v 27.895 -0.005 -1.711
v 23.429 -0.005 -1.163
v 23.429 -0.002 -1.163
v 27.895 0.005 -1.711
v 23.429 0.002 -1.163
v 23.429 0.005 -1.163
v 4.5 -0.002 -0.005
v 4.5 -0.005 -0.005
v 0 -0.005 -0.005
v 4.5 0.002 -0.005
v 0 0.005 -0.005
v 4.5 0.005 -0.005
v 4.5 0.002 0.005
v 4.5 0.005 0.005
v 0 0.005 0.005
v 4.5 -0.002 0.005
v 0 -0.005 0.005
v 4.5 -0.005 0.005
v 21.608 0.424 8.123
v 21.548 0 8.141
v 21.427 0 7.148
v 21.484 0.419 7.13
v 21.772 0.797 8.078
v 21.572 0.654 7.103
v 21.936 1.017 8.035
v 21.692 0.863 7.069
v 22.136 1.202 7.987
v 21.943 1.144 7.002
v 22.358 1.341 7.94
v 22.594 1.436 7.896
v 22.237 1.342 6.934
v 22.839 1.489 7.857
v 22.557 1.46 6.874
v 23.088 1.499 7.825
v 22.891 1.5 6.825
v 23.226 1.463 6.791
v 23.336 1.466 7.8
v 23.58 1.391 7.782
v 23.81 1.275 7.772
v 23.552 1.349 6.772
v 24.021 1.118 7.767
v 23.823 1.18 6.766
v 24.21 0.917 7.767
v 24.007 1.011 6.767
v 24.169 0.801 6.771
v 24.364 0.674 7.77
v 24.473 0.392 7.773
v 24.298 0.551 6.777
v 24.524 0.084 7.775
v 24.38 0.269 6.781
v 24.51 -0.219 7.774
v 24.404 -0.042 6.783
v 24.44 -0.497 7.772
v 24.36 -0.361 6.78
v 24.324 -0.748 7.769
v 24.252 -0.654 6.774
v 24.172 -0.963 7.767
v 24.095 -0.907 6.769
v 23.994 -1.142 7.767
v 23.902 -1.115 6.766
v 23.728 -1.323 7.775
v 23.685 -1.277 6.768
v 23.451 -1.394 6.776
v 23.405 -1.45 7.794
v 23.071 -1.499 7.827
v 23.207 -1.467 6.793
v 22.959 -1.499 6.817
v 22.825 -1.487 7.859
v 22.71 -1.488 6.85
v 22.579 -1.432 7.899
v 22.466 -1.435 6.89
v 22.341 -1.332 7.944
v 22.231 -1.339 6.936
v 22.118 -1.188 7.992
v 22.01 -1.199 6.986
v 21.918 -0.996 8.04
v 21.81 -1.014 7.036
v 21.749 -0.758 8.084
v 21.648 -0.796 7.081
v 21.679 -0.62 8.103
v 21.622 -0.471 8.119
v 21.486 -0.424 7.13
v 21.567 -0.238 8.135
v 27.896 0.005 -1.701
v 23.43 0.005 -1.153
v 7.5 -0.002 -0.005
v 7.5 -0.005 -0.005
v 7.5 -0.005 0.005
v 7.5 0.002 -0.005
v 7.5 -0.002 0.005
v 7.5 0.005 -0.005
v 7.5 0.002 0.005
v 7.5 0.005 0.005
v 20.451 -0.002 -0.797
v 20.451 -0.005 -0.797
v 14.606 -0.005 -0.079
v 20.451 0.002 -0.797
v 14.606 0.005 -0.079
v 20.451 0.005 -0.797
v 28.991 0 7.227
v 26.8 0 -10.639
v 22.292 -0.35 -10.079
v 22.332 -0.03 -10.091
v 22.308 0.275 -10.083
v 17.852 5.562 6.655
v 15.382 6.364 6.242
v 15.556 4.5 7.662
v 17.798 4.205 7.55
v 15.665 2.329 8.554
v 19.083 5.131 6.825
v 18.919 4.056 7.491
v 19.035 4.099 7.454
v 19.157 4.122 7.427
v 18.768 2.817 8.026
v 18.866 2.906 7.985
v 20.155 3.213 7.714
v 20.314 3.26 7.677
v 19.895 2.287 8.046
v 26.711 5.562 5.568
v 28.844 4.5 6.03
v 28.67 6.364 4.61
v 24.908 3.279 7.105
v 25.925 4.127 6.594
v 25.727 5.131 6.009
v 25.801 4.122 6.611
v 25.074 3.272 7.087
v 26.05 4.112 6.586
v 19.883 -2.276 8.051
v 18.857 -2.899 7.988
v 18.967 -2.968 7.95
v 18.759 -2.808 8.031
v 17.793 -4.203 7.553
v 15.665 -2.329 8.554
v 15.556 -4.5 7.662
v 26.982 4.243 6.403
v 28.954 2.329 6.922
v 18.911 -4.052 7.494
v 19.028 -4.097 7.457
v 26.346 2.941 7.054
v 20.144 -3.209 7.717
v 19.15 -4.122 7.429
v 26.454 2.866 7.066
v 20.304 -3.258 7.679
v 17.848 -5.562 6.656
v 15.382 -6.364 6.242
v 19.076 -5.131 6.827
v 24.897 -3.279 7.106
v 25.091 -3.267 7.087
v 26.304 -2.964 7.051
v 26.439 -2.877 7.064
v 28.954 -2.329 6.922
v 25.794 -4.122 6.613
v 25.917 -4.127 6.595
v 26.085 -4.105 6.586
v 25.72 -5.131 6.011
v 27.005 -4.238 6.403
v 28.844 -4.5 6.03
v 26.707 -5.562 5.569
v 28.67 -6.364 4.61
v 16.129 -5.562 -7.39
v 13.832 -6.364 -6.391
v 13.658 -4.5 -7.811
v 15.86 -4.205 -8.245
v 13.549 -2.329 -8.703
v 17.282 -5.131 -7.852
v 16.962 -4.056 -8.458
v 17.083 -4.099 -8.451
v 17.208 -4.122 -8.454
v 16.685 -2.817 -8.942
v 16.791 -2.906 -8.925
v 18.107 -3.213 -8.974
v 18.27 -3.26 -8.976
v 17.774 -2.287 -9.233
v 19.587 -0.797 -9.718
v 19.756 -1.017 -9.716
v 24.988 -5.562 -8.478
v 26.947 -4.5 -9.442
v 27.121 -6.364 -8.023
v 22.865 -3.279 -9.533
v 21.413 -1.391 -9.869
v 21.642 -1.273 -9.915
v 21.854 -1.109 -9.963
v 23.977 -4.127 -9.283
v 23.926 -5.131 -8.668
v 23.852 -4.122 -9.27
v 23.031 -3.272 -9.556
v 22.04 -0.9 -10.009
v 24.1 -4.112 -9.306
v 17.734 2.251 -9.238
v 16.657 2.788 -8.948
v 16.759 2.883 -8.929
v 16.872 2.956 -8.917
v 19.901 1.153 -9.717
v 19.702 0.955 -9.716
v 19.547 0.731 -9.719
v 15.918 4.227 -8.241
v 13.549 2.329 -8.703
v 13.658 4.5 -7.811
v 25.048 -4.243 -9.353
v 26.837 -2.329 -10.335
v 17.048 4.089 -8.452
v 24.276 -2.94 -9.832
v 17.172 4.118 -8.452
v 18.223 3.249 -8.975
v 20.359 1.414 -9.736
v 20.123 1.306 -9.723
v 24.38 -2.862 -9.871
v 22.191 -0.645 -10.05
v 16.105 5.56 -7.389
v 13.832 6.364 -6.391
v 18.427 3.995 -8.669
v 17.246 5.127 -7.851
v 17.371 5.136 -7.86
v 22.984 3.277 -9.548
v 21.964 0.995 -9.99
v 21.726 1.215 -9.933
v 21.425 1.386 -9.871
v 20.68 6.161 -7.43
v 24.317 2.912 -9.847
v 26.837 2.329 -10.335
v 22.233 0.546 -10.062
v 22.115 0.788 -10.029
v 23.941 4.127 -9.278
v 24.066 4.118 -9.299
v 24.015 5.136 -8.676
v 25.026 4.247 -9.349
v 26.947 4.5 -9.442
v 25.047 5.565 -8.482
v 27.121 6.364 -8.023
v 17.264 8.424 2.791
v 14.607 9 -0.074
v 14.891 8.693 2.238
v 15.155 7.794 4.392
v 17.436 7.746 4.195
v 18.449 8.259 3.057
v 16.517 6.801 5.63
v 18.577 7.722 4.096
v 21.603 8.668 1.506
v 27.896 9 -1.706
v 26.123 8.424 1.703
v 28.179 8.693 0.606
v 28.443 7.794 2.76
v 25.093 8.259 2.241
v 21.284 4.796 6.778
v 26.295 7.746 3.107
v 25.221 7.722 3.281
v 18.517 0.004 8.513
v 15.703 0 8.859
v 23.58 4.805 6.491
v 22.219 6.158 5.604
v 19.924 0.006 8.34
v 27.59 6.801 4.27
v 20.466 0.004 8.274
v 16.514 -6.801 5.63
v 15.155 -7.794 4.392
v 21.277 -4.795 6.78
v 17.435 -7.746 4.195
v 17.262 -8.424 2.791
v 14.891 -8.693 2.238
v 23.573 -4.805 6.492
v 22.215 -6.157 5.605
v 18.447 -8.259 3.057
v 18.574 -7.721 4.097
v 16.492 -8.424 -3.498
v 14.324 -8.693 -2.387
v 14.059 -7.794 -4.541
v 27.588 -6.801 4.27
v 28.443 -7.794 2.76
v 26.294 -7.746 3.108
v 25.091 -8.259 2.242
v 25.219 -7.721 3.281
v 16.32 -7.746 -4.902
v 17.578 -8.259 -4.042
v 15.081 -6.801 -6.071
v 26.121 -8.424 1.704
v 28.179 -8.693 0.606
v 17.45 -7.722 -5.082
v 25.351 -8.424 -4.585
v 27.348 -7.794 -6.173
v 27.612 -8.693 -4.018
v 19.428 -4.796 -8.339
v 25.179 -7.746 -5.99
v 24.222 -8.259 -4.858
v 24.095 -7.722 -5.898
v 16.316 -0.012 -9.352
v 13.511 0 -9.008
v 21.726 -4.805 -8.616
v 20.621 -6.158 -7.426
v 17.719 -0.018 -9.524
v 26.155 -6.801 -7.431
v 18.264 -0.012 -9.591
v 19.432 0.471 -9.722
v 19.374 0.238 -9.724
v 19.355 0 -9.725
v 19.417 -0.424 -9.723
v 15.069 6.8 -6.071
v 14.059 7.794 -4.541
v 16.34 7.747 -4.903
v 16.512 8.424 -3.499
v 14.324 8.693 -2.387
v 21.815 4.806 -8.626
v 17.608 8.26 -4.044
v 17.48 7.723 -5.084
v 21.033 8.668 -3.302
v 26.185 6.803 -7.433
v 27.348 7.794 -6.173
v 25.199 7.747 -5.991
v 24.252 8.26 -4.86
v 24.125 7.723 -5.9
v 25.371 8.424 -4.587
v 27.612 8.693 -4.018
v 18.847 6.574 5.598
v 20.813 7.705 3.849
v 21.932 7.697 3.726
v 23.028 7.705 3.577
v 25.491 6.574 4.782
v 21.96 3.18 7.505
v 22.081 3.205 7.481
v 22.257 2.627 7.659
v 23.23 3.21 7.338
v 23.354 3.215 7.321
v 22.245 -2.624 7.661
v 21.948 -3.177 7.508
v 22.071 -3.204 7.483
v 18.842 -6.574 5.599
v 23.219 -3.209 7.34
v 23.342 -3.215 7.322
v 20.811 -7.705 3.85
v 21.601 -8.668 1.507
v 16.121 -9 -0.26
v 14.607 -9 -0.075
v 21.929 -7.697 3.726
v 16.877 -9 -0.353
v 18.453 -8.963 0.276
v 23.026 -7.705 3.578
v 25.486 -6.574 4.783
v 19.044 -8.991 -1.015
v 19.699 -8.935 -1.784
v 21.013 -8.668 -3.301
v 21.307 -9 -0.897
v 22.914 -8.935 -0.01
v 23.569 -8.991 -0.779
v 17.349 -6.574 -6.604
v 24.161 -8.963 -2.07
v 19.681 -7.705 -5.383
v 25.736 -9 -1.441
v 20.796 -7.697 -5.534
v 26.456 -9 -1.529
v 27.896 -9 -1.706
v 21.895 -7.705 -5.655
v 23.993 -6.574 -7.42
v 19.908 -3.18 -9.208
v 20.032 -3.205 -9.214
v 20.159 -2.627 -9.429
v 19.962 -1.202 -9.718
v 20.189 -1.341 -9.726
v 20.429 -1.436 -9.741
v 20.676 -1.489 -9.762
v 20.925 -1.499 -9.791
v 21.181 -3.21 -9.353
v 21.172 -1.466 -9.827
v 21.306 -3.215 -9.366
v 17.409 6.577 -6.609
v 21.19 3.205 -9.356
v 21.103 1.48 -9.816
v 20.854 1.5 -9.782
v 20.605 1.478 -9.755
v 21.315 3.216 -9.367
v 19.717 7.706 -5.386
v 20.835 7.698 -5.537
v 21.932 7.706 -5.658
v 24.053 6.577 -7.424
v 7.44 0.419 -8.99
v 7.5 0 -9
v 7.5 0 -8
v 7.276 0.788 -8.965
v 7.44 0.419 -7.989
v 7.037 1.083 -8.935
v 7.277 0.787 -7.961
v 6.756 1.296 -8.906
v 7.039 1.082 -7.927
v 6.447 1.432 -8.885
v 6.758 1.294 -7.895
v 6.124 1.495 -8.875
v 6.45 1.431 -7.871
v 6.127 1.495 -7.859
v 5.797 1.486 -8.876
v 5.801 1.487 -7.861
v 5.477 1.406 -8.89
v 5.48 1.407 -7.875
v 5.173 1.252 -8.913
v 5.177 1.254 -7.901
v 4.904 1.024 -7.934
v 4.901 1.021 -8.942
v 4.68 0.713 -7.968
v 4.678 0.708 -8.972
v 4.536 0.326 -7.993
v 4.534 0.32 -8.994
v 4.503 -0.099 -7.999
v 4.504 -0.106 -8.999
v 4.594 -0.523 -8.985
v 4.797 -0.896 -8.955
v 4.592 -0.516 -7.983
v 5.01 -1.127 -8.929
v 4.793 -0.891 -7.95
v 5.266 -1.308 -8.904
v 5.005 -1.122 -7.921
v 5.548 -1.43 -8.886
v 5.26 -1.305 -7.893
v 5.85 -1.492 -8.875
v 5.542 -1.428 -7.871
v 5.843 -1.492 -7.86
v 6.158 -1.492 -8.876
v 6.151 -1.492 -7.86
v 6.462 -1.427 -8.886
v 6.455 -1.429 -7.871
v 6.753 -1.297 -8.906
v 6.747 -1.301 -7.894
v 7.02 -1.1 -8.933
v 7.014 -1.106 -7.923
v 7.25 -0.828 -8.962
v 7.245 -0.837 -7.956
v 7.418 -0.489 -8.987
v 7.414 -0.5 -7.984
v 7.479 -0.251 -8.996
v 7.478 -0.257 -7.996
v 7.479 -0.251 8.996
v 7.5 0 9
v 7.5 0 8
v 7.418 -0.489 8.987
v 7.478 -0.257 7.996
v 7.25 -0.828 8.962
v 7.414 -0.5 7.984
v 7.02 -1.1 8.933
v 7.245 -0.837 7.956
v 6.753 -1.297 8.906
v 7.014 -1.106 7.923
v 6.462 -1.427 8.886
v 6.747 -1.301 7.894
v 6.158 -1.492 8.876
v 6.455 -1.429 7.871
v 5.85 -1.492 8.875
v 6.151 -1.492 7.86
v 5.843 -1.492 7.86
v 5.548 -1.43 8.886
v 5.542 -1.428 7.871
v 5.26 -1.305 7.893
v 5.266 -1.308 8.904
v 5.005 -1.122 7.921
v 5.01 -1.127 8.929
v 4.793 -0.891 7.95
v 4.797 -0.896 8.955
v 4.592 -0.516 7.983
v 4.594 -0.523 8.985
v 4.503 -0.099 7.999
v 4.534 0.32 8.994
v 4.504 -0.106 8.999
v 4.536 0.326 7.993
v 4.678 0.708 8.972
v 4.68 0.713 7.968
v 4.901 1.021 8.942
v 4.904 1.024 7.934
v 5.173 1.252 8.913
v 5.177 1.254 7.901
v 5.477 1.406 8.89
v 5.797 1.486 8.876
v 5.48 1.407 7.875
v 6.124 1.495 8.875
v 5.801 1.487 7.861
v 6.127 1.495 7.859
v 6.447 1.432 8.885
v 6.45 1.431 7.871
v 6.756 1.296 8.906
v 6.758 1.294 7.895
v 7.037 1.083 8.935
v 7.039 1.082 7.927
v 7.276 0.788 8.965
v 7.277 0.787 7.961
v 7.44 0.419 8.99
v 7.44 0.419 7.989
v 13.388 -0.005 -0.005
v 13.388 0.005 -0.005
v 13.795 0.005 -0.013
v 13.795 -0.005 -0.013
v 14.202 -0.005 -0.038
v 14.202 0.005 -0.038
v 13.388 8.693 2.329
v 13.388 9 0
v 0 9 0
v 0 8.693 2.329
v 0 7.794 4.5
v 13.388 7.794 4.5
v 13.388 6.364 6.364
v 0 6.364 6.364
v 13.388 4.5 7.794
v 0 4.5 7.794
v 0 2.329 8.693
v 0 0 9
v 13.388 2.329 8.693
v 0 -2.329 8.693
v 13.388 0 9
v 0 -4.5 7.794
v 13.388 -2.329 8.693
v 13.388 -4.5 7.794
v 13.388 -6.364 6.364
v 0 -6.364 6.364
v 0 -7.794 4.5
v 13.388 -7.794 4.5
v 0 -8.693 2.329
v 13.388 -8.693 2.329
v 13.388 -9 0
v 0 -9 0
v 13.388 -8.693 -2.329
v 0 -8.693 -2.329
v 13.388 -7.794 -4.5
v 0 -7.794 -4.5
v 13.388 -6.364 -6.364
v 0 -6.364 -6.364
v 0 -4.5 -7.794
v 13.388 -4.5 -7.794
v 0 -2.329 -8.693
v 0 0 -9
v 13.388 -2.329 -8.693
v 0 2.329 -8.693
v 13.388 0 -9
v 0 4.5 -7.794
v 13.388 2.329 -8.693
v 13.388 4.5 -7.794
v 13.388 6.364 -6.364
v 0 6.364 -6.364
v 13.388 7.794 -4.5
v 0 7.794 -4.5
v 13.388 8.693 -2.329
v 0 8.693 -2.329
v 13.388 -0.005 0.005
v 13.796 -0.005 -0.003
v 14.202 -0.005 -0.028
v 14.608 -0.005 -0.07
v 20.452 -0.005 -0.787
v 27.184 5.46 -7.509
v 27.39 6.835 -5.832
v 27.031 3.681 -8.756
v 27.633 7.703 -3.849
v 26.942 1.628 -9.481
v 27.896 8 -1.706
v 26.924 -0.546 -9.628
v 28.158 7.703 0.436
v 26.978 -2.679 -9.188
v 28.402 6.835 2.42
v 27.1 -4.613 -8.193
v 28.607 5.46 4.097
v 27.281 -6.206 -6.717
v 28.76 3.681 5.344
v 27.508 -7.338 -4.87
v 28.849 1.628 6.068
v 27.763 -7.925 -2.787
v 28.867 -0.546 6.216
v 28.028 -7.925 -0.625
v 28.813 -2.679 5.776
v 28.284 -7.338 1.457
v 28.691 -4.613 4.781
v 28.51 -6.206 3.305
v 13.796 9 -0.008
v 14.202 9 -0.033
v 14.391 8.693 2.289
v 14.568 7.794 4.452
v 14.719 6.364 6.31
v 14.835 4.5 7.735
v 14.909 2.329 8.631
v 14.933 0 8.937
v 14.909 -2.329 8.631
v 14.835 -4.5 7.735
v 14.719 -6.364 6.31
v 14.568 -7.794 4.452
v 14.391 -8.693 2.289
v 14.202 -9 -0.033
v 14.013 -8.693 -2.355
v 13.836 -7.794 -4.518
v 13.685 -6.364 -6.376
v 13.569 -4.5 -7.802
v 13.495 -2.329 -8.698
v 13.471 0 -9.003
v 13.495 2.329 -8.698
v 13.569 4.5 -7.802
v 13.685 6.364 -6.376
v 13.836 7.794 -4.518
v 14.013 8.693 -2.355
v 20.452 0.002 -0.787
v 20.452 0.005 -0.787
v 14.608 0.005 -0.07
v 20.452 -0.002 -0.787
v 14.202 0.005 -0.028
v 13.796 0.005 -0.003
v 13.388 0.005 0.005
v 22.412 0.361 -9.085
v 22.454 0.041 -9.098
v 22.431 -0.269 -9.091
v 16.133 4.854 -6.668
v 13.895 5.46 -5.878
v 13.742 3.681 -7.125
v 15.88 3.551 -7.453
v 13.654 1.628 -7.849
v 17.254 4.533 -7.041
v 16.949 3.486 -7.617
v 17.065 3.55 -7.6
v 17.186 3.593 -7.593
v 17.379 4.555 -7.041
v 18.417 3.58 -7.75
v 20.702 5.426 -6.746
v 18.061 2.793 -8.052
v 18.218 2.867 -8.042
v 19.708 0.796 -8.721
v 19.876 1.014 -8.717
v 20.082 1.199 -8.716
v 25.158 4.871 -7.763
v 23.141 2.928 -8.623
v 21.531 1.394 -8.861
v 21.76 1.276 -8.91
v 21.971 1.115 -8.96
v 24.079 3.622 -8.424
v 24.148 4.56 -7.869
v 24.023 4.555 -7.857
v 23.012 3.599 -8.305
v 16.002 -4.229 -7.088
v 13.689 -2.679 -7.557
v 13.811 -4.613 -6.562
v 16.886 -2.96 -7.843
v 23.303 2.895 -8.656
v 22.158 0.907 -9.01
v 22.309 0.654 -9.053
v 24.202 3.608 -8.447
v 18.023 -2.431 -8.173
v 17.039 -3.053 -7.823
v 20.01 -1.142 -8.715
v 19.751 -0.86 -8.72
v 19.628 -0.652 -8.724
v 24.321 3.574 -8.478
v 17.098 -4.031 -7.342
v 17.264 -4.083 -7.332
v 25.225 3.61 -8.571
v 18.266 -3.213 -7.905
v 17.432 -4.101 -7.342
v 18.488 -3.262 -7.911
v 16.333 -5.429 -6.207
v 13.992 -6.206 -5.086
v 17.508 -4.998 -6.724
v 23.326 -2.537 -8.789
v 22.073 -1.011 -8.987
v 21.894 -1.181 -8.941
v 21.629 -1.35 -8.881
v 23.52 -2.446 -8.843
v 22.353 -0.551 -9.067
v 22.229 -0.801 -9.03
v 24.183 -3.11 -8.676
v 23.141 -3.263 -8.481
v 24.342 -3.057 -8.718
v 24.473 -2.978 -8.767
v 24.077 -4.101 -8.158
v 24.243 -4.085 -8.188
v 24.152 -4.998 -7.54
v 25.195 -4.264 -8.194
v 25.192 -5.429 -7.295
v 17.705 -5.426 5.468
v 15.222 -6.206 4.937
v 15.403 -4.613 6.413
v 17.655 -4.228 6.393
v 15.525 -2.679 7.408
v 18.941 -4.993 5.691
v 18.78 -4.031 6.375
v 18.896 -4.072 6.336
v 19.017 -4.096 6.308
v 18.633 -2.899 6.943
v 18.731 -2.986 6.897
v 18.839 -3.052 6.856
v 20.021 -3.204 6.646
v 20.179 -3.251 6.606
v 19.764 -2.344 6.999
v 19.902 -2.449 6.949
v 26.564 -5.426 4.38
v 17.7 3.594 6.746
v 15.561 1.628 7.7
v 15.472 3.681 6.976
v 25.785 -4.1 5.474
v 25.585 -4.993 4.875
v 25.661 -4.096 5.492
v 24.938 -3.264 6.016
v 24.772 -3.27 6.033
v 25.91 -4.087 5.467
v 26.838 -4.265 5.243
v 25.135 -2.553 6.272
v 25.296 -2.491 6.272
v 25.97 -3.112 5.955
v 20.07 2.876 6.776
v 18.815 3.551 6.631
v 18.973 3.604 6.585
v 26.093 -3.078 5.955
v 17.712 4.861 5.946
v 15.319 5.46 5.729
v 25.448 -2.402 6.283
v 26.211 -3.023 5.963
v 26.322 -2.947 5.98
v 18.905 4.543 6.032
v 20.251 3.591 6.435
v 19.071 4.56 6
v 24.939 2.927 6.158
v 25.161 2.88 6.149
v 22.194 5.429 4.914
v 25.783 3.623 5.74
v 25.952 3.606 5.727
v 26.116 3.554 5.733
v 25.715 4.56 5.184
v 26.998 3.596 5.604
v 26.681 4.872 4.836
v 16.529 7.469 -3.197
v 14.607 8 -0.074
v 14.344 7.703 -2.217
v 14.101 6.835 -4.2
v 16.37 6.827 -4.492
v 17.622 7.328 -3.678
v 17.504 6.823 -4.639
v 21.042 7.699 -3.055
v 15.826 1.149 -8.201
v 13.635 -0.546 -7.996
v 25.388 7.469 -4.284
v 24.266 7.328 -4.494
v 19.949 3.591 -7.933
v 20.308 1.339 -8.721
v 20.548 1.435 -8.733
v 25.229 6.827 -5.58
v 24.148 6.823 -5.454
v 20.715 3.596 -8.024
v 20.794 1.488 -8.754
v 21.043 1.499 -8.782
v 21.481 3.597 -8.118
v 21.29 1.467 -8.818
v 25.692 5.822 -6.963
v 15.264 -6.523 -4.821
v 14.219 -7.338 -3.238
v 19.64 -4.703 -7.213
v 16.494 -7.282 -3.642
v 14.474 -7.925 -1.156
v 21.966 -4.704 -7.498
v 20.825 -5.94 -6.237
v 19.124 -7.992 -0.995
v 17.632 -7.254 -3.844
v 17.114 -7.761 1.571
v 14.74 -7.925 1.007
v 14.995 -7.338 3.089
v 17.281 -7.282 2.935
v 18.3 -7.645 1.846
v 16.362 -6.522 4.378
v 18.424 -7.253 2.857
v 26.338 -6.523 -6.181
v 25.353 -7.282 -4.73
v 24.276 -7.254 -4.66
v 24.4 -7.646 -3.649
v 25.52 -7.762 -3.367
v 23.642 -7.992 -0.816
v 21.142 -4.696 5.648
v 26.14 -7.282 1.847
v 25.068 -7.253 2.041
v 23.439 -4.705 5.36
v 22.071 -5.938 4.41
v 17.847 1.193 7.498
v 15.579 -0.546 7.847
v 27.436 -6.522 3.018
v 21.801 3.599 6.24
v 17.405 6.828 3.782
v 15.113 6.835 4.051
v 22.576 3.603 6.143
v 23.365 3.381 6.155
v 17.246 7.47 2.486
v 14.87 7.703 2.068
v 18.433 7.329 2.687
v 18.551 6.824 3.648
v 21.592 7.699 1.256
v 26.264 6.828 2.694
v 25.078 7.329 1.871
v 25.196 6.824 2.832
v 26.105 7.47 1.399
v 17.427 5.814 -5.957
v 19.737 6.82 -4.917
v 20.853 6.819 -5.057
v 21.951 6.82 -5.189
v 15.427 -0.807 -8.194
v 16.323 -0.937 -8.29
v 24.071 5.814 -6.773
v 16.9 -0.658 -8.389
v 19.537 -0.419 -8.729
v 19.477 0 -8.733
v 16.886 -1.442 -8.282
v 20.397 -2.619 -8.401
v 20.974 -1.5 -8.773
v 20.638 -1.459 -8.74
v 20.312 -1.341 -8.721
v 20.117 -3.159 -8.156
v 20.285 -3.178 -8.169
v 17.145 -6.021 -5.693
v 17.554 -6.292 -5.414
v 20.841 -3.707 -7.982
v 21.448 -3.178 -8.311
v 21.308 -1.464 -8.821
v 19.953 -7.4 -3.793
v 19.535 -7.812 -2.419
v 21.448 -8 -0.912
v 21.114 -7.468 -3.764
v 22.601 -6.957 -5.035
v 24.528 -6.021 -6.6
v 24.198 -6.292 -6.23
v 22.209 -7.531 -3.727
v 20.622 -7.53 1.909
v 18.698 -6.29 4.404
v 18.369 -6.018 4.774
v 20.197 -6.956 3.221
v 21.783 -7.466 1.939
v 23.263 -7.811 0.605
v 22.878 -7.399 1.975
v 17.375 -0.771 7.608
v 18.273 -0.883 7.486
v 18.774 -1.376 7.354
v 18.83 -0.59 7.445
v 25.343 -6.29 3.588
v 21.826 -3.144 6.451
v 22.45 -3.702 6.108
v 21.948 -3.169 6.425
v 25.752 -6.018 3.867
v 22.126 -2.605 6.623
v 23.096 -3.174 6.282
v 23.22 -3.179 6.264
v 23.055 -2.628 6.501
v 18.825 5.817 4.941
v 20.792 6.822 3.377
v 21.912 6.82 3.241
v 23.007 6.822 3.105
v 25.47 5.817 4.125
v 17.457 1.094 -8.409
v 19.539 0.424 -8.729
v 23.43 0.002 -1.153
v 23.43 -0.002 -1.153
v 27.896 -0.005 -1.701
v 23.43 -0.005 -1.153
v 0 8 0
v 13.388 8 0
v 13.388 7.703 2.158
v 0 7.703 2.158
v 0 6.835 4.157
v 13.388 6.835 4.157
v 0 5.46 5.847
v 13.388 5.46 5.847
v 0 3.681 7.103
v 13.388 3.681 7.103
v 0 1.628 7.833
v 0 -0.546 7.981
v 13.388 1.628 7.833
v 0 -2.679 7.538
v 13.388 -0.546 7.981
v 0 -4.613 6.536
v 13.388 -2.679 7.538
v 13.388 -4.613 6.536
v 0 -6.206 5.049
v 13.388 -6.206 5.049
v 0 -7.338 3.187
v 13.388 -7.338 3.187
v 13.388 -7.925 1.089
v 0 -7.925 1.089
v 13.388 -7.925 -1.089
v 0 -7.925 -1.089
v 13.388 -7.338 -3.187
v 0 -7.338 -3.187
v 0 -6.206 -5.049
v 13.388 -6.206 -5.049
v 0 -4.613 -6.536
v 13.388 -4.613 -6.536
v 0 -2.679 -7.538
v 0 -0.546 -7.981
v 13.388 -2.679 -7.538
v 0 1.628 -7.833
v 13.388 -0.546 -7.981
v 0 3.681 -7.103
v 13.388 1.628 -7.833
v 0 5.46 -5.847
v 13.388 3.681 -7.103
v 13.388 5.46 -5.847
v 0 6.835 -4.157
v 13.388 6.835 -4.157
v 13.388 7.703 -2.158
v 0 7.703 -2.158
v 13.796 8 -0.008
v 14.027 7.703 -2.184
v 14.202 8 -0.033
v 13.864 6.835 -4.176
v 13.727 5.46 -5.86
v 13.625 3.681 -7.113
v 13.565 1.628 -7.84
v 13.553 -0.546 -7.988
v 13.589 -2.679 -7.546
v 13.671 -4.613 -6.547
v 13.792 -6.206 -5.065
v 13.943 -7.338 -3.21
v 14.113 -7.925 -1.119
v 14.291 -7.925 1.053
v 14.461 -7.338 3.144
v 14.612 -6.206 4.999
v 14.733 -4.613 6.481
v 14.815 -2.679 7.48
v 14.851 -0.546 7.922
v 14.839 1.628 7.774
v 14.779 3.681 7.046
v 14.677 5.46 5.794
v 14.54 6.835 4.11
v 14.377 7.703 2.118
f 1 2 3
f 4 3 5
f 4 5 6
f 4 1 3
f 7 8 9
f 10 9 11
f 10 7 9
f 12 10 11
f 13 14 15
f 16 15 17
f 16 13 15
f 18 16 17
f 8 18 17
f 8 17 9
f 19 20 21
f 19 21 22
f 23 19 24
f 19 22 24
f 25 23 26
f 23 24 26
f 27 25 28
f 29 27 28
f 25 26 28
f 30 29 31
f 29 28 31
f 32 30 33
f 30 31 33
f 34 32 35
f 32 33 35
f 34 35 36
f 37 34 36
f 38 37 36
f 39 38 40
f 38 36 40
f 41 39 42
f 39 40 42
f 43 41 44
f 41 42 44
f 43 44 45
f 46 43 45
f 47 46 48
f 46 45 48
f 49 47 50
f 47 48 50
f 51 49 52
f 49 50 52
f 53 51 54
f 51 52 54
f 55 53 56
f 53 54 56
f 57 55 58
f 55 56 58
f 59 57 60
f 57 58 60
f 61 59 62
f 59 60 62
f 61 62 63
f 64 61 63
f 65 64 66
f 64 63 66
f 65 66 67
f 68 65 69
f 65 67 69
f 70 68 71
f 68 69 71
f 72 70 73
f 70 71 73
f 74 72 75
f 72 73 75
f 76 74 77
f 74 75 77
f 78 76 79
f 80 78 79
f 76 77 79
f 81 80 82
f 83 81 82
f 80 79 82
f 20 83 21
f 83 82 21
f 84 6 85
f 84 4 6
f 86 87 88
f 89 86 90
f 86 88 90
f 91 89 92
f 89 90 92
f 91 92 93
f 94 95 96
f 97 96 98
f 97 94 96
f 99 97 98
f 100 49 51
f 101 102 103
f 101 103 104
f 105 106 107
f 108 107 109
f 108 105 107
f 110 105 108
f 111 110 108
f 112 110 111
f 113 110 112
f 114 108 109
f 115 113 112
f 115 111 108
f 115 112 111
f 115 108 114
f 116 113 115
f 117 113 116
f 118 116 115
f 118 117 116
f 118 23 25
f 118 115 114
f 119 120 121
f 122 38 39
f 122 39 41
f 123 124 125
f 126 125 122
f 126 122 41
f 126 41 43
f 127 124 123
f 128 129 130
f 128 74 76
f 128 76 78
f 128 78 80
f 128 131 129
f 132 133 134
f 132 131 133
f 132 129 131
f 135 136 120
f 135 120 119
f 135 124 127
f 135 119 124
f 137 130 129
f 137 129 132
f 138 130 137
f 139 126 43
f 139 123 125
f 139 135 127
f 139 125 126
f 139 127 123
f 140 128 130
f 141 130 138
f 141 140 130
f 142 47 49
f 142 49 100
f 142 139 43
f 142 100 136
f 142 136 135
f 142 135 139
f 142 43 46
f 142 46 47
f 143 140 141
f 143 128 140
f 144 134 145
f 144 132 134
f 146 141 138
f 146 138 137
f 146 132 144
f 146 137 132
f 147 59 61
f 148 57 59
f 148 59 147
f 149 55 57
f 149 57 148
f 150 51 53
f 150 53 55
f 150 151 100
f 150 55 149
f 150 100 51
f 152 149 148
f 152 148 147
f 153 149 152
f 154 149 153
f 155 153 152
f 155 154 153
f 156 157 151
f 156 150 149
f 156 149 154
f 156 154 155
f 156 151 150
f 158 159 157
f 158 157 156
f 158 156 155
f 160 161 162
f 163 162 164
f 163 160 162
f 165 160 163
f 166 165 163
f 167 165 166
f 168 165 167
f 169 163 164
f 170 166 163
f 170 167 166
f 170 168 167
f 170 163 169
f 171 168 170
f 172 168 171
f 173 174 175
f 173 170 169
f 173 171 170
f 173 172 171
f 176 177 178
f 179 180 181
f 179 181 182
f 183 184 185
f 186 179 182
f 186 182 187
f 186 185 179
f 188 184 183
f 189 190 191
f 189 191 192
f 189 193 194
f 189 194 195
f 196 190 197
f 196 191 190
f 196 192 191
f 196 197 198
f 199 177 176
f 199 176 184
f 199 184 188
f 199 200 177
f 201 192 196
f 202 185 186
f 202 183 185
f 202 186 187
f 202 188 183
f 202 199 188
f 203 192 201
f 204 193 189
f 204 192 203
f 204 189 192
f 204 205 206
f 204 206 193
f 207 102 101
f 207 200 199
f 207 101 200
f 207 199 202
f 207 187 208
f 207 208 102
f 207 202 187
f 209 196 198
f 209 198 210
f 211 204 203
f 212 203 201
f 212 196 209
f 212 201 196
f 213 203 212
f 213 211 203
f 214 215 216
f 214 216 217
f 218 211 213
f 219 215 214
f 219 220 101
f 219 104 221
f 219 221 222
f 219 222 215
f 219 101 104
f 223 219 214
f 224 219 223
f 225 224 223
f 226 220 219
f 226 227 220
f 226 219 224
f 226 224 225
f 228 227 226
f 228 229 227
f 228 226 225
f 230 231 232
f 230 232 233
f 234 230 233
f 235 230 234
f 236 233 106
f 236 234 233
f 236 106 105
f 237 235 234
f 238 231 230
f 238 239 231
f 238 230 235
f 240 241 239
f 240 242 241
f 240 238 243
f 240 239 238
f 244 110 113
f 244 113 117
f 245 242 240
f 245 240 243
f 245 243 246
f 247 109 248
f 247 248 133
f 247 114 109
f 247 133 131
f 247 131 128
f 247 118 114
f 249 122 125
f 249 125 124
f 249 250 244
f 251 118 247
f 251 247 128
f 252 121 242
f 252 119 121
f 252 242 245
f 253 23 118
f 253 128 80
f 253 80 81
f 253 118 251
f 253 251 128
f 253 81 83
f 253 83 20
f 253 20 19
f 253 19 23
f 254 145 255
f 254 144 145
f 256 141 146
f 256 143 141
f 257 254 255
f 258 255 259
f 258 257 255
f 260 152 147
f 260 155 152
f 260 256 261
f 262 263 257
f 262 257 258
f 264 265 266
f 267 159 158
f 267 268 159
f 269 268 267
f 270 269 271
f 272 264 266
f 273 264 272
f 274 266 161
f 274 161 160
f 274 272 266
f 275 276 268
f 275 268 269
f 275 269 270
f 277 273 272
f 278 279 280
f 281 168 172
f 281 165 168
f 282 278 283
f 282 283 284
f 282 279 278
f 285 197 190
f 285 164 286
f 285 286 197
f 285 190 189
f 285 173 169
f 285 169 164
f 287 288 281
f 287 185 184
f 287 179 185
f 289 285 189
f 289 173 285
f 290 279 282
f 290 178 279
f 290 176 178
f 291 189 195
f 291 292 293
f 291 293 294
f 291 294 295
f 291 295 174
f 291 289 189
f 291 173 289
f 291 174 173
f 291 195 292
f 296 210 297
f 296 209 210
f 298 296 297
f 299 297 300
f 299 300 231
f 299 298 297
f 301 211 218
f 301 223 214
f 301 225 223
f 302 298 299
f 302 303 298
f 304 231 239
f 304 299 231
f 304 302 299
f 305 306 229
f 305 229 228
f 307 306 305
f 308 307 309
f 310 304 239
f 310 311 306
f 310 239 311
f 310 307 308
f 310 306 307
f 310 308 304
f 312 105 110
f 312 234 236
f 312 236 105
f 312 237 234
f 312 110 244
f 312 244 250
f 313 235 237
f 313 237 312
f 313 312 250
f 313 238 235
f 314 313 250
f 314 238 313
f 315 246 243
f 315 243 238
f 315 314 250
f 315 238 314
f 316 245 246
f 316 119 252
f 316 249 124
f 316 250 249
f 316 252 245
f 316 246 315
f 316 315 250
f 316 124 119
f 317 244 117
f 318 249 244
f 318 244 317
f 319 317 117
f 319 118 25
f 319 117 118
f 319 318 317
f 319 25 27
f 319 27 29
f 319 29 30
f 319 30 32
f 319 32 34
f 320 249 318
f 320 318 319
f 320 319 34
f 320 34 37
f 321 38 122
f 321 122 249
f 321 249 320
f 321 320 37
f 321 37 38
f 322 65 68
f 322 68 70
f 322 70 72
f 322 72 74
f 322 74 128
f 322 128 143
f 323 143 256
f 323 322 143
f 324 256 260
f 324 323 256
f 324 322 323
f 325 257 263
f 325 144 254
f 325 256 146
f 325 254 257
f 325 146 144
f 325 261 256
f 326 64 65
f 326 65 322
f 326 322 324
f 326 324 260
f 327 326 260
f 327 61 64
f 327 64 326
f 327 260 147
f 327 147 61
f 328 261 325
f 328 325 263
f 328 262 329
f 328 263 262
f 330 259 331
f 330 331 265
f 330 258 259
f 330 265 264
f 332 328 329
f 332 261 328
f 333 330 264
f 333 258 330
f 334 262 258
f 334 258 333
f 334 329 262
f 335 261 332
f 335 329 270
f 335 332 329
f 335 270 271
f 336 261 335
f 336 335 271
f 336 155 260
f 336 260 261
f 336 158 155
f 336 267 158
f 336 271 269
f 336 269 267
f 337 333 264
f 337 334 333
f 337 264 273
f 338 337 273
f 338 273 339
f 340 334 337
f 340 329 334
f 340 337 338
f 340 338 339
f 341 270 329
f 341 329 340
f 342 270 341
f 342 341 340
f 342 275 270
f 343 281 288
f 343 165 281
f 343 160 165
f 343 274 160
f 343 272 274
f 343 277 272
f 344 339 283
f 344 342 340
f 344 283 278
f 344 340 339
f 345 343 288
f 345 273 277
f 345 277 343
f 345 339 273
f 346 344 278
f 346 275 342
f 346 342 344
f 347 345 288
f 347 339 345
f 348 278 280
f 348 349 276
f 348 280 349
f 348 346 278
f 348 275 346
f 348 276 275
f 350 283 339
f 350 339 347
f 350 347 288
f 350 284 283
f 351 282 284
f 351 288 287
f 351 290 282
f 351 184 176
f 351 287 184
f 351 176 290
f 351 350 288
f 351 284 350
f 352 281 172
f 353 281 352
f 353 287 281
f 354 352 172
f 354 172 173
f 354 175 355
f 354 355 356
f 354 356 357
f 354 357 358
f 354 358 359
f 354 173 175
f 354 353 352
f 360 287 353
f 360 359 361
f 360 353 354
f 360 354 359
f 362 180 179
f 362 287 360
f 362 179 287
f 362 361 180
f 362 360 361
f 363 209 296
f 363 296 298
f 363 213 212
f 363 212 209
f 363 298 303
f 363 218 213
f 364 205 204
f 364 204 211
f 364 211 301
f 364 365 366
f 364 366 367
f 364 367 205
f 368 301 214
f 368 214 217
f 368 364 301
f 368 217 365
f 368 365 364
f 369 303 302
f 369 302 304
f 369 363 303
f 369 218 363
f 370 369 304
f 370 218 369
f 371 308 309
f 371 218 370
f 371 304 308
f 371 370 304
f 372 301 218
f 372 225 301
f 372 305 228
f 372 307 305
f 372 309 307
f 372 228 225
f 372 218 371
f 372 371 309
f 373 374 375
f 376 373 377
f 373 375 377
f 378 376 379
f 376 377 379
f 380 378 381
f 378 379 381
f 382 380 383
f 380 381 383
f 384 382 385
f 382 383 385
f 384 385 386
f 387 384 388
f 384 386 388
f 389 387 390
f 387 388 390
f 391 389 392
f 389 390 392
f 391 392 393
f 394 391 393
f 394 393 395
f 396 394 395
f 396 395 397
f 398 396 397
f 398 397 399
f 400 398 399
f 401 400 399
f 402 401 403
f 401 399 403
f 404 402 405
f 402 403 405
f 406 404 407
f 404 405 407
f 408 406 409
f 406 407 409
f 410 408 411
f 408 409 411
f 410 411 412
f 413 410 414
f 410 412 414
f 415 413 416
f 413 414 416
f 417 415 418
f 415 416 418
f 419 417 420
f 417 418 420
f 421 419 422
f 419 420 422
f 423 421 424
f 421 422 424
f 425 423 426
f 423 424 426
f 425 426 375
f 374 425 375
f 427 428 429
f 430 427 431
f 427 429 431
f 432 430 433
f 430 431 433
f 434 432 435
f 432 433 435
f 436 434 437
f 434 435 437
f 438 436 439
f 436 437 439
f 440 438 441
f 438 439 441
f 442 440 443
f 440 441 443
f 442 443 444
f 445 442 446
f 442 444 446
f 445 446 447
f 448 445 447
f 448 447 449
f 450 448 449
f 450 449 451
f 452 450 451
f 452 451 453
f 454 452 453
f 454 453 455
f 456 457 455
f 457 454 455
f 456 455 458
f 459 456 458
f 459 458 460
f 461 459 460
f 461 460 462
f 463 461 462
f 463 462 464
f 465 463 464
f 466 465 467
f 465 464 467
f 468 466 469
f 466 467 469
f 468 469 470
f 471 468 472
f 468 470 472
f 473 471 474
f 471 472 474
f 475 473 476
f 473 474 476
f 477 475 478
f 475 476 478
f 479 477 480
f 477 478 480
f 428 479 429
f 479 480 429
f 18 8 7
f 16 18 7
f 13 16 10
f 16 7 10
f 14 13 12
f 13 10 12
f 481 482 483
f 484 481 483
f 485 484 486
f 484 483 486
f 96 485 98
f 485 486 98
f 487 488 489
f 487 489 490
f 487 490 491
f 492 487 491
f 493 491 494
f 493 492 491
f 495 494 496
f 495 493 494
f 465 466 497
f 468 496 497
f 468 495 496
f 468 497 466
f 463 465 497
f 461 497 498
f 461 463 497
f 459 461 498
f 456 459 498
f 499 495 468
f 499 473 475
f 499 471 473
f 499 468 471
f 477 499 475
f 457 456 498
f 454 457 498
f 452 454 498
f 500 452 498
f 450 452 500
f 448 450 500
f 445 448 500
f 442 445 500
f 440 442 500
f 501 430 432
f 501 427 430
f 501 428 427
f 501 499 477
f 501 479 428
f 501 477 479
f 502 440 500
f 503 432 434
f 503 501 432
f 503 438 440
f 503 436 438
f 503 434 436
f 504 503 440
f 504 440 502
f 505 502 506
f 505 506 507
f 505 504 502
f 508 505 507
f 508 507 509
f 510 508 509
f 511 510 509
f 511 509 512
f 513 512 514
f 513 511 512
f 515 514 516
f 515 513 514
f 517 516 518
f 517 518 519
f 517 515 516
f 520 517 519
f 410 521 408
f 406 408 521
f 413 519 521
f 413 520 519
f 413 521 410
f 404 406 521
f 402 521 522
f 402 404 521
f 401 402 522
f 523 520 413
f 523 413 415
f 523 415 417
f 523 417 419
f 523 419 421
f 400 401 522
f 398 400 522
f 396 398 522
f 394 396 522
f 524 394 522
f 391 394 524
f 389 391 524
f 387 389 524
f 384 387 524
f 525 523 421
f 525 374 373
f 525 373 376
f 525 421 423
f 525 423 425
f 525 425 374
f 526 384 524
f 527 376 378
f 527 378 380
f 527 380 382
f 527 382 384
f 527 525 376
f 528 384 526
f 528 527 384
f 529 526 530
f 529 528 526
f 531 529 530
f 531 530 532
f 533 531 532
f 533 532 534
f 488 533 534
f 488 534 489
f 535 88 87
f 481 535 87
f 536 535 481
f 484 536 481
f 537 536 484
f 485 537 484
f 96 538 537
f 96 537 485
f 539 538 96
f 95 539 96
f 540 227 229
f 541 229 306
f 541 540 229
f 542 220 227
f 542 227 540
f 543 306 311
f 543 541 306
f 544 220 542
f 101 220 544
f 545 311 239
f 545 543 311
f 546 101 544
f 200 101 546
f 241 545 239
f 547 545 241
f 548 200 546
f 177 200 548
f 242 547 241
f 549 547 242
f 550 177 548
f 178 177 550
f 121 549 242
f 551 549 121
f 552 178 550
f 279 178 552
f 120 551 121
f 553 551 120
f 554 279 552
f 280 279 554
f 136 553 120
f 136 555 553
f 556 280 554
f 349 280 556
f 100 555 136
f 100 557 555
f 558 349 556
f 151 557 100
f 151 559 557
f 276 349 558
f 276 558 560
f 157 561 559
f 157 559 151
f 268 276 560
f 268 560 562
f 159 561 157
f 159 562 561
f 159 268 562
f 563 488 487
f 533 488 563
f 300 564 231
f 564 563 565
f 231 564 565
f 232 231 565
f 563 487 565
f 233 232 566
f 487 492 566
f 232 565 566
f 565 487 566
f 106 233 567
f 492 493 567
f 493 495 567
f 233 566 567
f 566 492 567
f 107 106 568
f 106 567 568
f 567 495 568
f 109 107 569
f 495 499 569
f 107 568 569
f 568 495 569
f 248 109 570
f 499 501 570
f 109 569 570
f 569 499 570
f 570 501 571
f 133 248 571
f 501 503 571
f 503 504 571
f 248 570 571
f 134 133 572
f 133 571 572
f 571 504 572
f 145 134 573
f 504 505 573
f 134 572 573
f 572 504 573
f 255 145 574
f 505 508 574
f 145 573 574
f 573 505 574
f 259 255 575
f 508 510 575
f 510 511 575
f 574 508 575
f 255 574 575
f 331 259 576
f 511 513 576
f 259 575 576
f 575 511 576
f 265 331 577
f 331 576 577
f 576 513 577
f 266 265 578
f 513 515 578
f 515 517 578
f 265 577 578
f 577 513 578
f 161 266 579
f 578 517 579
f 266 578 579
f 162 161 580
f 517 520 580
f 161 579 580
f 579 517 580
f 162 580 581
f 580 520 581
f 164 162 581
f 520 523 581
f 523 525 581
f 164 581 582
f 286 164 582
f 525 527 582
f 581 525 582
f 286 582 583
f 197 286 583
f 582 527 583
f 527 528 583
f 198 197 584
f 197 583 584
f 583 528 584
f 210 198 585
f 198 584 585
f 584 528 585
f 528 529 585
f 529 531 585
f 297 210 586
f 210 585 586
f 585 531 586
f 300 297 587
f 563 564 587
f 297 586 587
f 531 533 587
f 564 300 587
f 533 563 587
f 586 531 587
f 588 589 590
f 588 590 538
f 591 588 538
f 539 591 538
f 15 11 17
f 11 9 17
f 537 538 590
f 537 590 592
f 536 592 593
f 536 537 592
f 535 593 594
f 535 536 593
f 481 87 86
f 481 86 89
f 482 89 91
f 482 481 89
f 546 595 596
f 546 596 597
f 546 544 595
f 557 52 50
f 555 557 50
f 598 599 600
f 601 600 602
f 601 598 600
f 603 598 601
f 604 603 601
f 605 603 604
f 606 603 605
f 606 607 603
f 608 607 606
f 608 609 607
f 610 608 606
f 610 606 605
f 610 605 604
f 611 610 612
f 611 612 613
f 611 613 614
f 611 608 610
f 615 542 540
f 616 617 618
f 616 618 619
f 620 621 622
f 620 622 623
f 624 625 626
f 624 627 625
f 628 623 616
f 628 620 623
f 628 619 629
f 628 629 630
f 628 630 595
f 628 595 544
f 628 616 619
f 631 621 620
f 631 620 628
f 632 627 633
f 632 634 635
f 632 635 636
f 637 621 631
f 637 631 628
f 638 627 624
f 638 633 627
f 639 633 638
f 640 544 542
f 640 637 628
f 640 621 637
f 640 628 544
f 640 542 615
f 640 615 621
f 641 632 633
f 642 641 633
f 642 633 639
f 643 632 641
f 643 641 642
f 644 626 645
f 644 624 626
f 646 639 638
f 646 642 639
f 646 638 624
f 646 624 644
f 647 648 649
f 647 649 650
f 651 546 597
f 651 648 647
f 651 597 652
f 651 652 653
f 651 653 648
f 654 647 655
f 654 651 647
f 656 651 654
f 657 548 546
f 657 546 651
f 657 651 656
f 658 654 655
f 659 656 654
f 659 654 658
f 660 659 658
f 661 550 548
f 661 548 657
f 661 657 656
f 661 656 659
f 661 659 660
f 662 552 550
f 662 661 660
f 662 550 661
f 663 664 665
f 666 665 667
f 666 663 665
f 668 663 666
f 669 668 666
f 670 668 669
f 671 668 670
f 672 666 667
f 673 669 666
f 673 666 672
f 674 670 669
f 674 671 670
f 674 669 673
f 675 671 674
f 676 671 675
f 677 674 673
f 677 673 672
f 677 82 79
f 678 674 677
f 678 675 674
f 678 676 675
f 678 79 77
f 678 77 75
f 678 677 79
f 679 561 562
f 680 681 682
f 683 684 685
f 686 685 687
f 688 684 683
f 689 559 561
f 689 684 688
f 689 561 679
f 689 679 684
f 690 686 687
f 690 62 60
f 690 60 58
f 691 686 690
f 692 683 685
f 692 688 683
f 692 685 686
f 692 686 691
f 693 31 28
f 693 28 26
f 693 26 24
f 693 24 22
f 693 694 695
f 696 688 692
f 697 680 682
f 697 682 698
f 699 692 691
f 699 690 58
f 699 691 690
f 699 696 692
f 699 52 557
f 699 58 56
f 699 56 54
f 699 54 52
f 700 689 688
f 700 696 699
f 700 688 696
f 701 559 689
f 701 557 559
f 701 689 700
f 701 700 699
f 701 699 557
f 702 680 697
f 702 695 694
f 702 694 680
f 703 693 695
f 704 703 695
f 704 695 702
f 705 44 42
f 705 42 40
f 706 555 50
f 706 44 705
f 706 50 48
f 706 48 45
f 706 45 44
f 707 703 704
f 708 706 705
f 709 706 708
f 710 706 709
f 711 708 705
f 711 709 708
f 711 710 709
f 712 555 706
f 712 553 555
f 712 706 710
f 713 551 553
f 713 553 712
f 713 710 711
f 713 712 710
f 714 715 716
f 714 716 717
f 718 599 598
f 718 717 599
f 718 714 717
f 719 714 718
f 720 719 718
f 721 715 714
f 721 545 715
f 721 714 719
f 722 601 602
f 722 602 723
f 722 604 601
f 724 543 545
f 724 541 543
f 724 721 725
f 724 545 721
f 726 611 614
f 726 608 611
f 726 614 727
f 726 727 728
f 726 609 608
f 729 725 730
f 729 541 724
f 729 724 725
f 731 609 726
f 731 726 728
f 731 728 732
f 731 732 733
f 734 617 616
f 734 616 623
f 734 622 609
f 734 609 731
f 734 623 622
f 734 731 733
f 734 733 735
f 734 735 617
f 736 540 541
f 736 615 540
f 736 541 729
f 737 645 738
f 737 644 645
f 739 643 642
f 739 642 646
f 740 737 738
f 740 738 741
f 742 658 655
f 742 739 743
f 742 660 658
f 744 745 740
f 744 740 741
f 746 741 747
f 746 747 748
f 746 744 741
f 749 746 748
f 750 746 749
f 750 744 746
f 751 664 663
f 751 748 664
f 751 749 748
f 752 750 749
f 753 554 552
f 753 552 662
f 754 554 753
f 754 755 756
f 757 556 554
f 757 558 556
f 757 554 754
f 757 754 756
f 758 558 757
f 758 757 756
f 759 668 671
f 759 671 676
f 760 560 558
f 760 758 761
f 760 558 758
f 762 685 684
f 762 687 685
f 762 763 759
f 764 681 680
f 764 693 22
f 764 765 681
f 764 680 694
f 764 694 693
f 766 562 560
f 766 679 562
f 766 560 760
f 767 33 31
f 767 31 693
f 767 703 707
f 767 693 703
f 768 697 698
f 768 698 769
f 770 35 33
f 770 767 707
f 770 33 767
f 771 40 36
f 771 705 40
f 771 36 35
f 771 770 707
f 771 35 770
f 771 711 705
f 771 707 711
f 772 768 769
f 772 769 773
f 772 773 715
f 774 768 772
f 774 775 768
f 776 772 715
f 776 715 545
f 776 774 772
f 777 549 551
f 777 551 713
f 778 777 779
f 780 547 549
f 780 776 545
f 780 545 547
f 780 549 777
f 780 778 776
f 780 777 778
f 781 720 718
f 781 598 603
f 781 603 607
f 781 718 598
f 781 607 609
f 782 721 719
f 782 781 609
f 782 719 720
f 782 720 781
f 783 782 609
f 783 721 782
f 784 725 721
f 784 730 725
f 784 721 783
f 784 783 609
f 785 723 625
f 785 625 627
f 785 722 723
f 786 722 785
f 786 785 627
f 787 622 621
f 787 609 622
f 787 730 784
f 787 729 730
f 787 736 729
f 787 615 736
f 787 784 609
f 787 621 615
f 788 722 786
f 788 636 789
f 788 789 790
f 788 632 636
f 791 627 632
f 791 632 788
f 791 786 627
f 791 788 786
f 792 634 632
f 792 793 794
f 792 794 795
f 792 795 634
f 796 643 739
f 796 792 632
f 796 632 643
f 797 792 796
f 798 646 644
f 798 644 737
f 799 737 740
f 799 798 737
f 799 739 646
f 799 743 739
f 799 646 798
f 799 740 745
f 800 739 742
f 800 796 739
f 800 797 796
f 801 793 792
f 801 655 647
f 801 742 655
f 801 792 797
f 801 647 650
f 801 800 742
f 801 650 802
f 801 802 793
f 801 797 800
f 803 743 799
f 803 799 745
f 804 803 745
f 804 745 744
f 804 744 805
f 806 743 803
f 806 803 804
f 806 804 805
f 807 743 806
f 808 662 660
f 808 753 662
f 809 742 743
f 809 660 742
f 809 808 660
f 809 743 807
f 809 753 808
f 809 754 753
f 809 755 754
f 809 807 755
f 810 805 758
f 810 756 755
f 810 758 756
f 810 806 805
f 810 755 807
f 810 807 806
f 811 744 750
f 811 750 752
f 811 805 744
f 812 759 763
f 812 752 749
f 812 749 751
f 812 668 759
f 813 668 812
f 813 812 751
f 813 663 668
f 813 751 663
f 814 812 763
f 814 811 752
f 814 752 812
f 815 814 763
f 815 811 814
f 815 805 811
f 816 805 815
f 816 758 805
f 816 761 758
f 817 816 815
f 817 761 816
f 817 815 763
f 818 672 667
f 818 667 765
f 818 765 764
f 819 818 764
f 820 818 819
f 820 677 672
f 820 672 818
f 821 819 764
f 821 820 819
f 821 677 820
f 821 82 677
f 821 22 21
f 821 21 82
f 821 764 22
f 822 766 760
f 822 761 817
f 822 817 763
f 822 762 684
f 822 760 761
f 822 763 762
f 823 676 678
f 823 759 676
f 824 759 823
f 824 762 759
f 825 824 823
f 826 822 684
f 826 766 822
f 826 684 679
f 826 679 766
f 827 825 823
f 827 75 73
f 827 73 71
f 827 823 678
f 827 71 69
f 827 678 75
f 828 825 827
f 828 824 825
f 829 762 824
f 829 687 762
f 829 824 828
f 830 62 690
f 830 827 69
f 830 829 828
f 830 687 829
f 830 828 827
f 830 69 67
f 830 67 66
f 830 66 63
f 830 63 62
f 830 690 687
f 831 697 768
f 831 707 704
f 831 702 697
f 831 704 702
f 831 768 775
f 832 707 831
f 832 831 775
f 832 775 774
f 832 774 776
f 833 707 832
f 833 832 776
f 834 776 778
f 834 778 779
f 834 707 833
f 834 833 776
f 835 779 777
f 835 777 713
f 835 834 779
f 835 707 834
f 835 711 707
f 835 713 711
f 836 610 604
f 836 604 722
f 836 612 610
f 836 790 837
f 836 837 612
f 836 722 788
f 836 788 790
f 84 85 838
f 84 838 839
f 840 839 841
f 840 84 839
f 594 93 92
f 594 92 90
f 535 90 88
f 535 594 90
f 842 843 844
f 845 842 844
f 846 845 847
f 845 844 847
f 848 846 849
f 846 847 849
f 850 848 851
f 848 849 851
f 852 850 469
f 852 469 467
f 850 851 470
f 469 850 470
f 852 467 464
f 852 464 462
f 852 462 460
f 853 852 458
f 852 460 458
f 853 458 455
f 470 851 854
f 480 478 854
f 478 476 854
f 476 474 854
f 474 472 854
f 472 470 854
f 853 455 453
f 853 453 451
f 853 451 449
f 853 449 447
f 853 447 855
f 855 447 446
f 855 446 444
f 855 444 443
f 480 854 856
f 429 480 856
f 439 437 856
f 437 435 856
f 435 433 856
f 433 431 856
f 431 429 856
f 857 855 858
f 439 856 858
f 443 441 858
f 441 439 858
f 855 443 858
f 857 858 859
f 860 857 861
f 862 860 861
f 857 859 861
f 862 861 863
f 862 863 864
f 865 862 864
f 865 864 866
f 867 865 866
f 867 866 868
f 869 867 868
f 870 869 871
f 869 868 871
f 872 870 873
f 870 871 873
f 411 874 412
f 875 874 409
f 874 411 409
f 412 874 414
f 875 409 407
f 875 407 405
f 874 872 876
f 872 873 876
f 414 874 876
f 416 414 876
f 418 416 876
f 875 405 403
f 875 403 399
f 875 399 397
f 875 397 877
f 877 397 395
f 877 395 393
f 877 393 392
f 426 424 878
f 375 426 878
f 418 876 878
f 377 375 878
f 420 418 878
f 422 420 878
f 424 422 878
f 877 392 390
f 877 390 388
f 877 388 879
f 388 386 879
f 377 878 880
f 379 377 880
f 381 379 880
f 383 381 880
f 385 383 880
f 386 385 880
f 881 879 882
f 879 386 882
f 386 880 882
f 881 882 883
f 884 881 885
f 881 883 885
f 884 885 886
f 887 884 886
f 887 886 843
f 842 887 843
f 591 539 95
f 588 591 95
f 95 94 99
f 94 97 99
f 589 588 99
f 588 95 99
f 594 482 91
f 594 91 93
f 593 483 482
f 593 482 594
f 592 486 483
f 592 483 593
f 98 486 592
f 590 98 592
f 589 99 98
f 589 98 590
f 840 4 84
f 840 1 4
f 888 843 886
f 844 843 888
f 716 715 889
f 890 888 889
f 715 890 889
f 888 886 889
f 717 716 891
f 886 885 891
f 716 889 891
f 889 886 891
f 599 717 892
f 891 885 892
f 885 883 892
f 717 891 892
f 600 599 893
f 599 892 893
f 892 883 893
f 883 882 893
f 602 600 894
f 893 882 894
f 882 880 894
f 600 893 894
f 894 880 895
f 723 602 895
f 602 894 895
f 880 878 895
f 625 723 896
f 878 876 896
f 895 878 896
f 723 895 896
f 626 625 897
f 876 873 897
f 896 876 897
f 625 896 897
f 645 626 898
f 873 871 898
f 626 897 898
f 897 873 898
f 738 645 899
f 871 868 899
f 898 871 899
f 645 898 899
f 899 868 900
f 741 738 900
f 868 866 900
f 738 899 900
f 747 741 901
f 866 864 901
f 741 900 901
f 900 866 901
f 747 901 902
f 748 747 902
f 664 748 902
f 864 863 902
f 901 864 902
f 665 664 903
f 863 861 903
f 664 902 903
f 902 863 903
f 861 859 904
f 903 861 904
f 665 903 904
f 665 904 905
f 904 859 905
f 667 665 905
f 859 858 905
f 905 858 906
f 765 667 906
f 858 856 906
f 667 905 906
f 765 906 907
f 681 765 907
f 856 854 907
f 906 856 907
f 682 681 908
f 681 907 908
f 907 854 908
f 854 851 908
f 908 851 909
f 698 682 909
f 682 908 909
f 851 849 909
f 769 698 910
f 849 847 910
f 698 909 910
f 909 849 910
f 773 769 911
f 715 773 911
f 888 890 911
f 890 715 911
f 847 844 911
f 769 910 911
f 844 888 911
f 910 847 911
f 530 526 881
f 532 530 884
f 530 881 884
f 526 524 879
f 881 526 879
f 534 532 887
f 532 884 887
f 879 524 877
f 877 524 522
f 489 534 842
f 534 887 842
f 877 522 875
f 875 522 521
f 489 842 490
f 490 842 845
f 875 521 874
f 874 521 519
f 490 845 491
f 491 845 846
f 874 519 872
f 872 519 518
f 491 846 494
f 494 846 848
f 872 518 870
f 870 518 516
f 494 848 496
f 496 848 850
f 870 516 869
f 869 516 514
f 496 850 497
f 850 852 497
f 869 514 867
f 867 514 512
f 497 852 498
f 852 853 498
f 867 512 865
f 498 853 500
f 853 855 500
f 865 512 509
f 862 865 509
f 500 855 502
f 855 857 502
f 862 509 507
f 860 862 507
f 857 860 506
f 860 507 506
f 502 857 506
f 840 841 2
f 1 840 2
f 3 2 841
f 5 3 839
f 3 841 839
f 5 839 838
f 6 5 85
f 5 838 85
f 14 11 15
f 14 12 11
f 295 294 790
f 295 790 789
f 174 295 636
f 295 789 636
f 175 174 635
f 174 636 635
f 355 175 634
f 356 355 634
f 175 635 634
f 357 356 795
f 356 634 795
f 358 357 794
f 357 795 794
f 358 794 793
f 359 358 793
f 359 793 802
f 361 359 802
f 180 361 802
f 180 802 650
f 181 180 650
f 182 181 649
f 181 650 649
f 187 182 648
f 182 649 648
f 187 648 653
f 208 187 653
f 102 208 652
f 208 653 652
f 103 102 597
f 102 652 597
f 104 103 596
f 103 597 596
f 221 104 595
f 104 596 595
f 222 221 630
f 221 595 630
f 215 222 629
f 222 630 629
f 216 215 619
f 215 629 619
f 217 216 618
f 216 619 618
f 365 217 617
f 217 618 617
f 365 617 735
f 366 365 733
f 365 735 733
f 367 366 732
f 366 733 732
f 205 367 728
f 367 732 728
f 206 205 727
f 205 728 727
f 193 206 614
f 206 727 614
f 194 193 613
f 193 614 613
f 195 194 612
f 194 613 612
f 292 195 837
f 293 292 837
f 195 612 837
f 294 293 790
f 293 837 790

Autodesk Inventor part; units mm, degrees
ref_plane "YZ Plane" through (0, 0, 0) normal (1, 0, 0) x (0, 1, 0)
ref_plane "XZ Plane" through (0, 0, 0) normal (0, 1, 0) x (-1, 0, 0)
ref_plane "XY Plane" through (0, 0, 0) normal (0, 0, 1) x (1, 0, 0)
sketch "Sketch5" plane through (0, 0, 0) normal (0, 1, 0) x (-1, 0, 0)
  line L0 (0, 0) -> (-13.3884, 0)
  line L1 (-14.6071, -0.0745) -> (-27.8956, -1.7062)
  arc A0 (-13.3884, 0) -> (-14.6071, -0.0745) centre (-13.3884, -10) ccw
  point P0 (-14, 0)
  dimension "d122" = 14
  dimension "d123" = 14
  dimension "d124" = 173
  dimension "d125" = 10
sketch "Sketch6" plane through (0, 0, 0) normal (1, 0, 0) x (0, 1, 0)
  circle A0 centre (0, 0) radius 8
  circle A1 centre (0, 0) radius 9
  line L0 (-0.005, -0.005) -> (0.005, -0.005)
  line L1 (0.005, -0.005) -> (0.005, 0.005)
  line L2 (0.005, 0.005) -> (-0.005, 0.005)
  line L3 (-0.005, 0.005) -> (-0.005, -0.005)
  line L4 (-0.005, -0.005) -> (0.005, 0.005) construction
  line L5 (0.005, -0.005) -> (-0.005, 0.005) construction
  dimension "d126" = 16
  dimension "d127" = 18
  dimension "d138" = 0.01
  dimension "d139" = 0.01
sweep "Sweep1" add profiles "Sketch6" path "Sketch5"
sketch "Sketch7" plane through (0, 0, 0) normal (0, 0, 1) x (1, 0, 0)
  line L0 (0, 0) -> (6, 0) construction
  circle A0 centre (6, 0) radius 1.5
  dimension "d130" = 6
  dimension "d131" = 3
extrude "Extrusion8" cut sketch "Sketch7" along normal mid plane 25
sketch "Sketch8" plane through (14.6065, -0.005, -0.0795) normal (-0.1219, 0, -0.9925) x (-0.9925, 0, 0.1219)
  line L0 (-13.3884, 0) -> (-13.3884, 0.01) projected
  line L1 (-13.3884, 0.005) -> (-7.3884, 0.005) construction
  circle A0 centre (-7.3884, 0.005) radius 1.5
  point P0 (14.5073, 0.005)
  dimension "d134" = 6
  dimension "d135" = 3
extrude "Extrusion9" cut sketch "Sketch8" along normal mid plane 25
properties part number "airfoil"
